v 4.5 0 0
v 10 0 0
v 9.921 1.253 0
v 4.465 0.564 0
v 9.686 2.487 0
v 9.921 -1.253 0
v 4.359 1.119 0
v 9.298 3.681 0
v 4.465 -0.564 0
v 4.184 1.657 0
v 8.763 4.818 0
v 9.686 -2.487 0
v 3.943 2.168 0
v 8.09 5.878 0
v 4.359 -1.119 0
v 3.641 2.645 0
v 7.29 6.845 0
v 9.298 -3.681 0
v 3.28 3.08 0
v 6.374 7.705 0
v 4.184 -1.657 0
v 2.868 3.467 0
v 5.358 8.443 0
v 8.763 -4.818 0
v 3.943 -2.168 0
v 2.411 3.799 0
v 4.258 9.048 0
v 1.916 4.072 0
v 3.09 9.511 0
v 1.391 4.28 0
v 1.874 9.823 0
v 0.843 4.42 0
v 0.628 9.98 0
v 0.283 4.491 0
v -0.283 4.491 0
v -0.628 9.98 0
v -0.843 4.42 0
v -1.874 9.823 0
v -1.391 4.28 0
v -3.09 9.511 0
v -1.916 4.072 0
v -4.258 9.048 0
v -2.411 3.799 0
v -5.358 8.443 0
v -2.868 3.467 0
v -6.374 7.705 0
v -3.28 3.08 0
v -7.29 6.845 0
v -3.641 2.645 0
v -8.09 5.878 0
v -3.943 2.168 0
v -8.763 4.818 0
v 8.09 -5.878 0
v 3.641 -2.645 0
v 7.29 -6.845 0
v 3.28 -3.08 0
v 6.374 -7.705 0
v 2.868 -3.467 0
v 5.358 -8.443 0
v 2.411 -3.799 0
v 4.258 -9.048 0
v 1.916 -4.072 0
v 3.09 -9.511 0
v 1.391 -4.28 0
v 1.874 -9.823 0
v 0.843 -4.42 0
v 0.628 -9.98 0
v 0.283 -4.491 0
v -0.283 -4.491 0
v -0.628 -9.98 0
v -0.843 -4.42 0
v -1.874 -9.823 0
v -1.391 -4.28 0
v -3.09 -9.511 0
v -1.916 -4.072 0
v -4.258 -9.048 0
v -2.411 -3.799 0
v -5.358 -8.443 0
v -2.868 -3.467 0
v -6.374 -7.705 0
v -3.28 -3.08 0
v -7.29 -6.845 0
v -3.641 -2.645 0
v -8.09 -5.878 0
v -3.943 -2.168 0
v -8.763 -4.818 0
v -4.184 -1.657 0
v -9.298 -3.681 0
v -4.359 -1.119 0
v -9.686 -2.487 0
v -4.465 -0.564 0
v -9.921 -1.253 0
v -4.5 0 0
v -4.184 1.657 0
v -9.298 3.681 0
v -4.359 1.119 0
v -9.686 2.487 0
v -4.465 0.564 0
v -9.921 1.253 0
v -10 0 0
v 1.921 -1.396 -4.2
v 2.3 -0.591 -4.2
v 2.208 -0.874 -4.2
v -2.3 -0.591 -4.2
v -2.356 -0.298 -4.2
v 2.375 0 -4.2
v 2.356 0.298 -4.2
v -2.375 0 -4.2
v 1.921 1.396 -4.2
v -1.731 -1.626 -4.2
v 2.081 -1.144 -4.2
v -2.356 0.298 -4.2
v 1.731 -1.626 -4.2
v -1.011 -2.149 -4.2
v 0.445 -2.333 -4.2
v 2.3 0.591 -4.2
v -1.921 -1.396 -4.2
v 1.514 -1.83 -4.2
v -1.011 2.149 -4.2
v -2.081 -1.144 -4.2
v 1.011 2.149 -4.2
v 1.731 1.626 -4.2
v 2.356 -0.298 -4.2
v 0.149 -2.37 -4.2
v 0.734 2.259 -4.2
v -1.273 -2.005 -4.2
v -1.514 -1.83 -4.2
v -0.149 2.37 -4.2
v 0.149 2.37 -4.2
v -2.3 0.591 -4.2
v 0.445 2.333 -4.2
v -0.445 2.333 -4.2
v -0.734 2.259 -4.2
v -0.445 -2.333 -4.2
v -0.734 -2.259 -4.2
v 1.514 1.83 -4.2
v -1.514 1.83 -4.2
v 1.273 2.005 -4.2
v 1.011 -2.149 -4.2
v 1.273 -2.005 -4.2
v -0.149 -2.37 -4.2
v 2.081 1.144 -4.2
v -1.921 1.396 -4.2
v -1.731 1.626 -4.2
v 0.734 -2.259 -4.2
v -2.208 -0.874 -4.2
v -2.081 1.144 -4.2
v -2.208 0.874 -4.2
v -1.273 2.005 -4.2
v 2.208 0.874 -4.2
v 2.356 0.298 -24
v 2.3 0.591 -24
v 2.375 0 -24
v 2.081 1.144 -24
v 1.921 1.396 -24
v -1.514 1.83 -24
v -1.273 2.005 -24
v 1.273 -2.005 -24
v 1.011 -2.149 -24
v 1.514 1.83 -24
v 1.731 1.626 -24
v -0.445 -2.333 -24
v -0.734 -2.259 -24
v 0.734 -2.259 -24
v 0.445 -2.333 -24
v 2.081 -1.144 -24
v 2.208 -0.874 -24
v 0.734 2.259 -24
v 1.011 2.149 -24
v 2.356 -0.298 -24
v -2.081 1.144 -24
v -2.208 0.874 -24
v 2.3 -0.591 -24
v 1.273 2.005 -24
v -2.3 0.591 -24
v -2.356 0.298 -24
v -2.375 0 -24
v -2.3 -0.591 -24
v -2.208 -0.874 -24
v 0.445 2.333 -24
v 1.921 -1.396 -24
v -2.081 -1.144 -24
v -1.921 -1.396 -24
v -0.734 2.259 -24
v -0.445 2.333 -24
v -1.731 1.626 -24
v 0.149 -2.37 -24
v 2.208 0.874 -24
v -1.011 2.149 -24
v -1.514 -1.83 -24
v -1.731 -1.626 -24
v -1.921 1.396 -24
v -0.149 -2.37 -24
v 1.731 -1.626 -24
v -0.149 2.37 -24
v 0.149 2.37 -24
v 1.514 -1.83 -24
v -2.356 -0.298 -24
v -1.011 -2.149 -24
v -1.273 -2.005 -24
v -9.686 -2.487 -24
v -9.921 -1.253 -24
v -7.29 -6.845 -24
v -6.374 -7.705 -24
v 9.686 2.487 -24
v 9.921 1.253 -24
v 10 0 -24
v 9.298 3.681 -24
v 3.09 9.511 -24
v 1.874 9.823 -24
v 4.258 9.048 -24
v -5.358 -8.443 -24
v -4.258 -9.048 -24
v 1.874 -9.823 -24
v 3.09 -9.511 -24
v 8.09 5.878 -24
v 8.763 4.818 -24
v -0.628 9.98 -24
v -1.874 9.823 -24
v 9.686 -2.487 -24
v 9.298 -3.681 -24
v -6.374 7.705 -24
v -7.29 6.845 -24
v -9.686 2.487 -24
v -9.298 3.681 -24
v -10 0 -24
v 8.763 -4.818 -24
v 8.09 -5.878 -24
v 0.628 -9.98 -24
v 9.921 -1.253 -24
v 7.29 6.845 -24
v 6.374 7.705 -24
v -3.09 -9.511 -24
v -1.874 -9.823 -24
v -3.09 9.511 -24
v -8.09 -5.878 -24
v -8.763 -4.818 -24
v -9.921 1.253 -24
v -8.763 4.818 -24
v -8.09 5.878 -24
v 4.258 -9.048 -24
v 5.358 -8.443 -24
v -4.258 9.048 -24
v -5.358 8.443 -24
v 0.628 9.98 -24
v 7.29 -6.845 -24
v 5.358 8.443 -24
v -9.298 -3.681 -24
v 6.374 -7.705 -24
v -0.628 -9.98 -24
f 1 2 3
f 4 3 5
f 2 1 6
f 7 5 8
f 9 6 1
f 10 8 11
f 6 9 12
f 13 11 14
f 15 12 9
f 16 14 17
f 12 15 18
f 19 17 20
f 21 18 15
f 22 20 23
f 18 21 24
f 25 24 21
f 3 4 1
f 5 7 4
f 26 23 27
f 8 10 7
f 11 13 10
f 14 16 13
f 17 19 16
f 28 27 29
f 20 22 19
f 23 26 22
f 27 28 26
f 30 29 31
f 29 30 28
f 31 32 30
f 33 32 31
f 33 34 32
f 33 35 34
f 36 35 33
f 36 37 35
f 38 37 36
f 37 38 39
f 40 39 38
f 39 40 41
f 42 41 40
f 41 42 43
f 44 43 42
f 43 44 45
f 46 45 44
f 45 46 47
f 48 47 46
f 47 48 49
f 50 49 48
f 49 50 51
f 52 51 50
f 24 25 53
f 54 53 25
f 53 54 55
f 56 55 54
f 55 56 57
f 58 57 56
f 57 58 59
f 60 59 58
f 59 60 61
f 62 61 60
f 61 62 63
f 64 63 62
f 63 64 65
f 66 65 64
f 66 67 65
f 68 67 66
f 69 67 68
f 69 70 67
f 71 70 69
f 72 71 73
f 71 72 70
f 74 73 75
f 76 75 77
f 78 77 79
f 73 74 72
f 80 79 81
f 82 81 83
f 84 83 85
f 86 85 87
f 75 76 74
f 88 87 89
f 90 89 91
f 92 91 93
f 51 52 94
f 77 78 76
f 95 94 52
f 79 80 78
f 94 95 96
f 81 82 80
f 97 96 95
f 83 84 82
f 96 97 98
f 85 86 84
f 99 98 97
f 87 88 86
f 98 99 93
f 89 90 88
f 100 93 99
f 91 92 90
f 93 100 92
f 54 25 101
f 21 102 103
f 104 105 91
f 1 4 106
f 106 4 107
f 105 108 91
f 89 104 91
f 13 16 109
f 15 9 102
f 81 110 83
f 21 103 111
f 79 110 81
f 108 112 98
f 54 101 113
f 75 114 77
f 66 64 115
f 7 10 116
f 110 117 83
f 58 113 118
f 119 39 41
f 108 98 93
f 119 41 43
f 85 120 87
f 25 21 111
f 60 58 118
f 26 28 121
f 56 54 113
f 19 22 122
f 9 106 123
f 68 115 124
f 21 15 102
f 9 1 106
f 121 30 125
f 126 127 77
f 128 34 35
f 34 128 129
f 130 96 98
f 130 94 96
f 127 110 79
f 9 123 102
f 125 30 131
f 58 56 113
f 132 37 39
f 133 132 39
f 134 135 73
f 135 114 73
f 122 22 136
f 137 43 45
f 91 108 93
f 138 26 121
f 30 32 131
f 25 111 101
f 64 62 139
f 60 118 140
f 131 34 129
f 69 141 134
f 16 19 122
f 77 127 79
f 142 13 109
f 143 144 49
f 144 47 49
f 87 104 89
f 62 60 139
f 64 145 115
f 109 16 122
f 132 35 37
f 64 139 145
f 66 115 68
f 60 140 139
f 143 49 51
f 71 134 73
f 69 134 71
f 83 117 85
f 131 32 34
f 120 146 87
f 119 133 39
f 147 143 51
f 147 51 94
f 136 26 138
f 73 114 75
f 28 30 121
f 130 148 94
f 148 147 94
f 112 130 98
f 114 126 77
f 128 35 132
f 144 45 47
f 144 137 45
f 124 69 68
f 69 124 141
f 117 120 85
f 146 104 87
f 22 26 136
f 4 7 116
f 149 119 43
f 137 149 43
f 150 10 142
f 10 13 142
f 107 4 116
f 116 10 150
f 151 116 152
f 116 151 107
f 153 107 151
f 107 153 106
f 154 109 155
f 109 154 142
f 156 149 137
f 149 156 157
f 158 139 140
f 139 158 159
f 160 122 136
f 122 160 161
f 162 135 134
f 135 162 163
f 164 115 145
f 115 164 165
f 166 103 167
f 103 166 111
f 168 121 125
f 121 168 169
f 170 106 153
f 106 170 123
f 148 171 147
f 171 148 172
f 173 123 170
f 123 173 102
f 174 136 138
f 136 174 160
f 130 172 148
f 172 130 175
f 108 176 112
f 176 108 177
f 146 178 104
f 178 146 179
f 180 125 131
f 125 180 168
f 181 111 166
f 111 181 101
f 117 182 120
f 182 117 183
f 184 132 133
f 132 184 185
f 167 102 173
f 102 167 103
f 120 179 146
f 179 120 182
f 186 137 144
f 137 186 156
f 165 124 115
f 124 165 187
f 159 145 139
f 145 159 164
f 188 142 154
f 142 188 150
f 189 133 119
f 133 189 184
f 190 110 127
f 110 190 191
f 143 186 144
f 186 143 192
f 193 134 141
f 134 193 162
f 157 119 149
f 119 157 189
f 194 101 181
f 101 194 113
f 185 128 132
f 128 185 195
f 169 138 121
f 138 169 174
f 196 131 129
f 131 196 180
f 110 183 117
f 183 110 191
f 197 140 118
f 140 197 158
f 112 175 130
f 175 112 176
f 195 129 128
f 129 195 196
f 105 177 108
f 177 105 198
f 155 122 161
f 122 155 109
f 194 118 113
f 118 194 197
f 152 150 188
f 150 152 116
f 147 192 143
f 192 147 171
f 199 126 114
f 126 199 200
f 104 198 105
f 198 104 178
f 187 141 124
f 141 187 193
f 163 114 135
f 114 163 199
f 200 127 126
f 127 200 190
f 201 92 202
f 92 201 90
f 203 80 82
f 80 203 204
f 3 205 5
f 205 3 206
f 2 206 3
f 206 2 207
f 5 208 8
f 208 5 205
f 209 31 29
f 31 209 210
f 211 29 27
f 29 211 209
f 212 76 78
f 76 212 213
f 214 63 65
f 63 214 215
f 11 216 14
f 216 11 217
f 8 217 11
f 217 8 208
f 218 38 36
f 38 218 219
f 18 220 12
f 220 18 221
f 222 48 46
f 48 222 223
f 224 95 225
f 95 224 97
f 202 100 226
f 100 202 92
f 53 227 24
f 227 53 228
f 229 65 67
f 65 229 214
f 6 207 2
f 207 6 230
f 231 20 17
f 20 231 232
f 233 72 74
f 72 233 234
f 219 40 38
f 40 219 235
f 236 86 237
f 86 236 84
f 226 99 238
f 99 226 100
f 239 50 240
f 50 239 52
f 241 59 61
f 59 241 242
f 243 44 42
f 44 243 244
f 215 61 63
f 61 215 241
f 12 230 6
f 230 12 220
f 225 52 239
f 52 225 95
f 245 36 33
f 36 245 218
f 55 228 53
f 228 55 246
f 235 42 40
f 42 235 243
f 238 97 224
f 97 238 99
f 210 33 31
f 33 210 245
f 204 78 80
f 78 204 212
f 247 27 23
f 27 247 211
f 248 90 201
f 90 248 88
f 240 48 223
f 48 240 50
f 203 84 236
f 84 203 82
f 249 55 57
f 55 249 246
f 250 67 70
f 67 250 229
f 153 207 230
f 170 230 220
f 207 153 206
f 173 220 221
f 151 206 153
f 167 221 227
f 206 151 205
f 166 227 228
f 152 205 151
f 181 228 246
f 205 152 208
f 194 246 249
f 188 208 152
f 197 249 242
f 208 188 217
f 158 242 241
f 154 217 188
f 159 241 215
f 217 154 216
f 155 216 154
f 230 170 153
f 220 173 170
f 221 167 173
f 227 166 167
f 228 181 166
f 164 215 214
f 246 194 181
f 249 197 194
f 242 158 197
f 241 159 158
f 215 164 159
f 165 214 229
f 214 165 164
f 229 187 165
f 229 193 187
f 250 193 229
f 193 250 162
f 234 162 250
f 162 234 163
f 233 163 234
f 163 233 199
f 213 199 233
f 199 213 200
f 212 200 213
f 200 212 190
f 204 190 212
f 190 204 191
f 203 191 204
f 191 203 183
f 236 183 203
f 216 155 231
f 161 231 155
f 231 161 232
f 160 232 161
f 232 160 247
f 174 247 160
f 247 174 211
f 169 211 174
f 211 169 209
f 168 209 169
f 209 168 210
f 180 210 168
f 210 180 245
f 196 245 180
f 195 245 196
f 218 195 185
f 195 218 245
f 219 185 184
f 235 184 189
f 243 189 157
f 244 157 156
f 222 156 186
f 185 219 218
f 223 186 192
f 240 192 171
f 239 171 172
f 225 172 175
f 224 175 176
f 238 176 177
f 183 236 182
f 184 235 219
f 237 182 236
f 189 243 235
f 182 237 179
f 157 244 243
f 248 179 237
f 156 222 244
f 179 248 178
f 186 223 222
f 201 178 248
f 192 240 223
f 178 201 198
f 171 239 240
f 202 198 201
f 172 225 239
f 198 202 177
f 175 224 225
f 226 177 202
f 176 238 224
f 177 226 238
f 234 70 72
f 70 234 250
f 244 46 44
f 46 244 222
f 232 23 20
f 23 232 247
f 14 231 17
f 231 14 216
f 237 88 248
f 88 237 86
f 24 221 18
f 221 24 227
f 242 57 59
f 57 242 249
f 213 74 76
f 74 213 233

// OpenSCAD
$fn = 50;

difference() {
	union() {
		translate(v = [0, 0, -24.0]) {
			cylinder(h = 24, r = 10.0);
		}
	}
	union() {
		translate(v = [0, 0, 0]) {
			rotate(a = [0, 0, 0]) {
				difference() {
					union() {
						translate(v = [0, 0, -27.0]) {
							cylinder(h = 27, r = 2.25);
						}
						translate(v = [0, 0, -4.2]) {
							cylinder(h = 4.2, r1 = 2.375, r2 = 4.5);
						}
						translate(v = [0, 0, -27.0]) {
							cylinder(h = 27, r = 2.375);
						}
						translate(v = [0, 0, -27.0]) {
							cylinder(h = 27, r = 2.25);
						}
					}
					union();
				}
			}
		}
	}
}
